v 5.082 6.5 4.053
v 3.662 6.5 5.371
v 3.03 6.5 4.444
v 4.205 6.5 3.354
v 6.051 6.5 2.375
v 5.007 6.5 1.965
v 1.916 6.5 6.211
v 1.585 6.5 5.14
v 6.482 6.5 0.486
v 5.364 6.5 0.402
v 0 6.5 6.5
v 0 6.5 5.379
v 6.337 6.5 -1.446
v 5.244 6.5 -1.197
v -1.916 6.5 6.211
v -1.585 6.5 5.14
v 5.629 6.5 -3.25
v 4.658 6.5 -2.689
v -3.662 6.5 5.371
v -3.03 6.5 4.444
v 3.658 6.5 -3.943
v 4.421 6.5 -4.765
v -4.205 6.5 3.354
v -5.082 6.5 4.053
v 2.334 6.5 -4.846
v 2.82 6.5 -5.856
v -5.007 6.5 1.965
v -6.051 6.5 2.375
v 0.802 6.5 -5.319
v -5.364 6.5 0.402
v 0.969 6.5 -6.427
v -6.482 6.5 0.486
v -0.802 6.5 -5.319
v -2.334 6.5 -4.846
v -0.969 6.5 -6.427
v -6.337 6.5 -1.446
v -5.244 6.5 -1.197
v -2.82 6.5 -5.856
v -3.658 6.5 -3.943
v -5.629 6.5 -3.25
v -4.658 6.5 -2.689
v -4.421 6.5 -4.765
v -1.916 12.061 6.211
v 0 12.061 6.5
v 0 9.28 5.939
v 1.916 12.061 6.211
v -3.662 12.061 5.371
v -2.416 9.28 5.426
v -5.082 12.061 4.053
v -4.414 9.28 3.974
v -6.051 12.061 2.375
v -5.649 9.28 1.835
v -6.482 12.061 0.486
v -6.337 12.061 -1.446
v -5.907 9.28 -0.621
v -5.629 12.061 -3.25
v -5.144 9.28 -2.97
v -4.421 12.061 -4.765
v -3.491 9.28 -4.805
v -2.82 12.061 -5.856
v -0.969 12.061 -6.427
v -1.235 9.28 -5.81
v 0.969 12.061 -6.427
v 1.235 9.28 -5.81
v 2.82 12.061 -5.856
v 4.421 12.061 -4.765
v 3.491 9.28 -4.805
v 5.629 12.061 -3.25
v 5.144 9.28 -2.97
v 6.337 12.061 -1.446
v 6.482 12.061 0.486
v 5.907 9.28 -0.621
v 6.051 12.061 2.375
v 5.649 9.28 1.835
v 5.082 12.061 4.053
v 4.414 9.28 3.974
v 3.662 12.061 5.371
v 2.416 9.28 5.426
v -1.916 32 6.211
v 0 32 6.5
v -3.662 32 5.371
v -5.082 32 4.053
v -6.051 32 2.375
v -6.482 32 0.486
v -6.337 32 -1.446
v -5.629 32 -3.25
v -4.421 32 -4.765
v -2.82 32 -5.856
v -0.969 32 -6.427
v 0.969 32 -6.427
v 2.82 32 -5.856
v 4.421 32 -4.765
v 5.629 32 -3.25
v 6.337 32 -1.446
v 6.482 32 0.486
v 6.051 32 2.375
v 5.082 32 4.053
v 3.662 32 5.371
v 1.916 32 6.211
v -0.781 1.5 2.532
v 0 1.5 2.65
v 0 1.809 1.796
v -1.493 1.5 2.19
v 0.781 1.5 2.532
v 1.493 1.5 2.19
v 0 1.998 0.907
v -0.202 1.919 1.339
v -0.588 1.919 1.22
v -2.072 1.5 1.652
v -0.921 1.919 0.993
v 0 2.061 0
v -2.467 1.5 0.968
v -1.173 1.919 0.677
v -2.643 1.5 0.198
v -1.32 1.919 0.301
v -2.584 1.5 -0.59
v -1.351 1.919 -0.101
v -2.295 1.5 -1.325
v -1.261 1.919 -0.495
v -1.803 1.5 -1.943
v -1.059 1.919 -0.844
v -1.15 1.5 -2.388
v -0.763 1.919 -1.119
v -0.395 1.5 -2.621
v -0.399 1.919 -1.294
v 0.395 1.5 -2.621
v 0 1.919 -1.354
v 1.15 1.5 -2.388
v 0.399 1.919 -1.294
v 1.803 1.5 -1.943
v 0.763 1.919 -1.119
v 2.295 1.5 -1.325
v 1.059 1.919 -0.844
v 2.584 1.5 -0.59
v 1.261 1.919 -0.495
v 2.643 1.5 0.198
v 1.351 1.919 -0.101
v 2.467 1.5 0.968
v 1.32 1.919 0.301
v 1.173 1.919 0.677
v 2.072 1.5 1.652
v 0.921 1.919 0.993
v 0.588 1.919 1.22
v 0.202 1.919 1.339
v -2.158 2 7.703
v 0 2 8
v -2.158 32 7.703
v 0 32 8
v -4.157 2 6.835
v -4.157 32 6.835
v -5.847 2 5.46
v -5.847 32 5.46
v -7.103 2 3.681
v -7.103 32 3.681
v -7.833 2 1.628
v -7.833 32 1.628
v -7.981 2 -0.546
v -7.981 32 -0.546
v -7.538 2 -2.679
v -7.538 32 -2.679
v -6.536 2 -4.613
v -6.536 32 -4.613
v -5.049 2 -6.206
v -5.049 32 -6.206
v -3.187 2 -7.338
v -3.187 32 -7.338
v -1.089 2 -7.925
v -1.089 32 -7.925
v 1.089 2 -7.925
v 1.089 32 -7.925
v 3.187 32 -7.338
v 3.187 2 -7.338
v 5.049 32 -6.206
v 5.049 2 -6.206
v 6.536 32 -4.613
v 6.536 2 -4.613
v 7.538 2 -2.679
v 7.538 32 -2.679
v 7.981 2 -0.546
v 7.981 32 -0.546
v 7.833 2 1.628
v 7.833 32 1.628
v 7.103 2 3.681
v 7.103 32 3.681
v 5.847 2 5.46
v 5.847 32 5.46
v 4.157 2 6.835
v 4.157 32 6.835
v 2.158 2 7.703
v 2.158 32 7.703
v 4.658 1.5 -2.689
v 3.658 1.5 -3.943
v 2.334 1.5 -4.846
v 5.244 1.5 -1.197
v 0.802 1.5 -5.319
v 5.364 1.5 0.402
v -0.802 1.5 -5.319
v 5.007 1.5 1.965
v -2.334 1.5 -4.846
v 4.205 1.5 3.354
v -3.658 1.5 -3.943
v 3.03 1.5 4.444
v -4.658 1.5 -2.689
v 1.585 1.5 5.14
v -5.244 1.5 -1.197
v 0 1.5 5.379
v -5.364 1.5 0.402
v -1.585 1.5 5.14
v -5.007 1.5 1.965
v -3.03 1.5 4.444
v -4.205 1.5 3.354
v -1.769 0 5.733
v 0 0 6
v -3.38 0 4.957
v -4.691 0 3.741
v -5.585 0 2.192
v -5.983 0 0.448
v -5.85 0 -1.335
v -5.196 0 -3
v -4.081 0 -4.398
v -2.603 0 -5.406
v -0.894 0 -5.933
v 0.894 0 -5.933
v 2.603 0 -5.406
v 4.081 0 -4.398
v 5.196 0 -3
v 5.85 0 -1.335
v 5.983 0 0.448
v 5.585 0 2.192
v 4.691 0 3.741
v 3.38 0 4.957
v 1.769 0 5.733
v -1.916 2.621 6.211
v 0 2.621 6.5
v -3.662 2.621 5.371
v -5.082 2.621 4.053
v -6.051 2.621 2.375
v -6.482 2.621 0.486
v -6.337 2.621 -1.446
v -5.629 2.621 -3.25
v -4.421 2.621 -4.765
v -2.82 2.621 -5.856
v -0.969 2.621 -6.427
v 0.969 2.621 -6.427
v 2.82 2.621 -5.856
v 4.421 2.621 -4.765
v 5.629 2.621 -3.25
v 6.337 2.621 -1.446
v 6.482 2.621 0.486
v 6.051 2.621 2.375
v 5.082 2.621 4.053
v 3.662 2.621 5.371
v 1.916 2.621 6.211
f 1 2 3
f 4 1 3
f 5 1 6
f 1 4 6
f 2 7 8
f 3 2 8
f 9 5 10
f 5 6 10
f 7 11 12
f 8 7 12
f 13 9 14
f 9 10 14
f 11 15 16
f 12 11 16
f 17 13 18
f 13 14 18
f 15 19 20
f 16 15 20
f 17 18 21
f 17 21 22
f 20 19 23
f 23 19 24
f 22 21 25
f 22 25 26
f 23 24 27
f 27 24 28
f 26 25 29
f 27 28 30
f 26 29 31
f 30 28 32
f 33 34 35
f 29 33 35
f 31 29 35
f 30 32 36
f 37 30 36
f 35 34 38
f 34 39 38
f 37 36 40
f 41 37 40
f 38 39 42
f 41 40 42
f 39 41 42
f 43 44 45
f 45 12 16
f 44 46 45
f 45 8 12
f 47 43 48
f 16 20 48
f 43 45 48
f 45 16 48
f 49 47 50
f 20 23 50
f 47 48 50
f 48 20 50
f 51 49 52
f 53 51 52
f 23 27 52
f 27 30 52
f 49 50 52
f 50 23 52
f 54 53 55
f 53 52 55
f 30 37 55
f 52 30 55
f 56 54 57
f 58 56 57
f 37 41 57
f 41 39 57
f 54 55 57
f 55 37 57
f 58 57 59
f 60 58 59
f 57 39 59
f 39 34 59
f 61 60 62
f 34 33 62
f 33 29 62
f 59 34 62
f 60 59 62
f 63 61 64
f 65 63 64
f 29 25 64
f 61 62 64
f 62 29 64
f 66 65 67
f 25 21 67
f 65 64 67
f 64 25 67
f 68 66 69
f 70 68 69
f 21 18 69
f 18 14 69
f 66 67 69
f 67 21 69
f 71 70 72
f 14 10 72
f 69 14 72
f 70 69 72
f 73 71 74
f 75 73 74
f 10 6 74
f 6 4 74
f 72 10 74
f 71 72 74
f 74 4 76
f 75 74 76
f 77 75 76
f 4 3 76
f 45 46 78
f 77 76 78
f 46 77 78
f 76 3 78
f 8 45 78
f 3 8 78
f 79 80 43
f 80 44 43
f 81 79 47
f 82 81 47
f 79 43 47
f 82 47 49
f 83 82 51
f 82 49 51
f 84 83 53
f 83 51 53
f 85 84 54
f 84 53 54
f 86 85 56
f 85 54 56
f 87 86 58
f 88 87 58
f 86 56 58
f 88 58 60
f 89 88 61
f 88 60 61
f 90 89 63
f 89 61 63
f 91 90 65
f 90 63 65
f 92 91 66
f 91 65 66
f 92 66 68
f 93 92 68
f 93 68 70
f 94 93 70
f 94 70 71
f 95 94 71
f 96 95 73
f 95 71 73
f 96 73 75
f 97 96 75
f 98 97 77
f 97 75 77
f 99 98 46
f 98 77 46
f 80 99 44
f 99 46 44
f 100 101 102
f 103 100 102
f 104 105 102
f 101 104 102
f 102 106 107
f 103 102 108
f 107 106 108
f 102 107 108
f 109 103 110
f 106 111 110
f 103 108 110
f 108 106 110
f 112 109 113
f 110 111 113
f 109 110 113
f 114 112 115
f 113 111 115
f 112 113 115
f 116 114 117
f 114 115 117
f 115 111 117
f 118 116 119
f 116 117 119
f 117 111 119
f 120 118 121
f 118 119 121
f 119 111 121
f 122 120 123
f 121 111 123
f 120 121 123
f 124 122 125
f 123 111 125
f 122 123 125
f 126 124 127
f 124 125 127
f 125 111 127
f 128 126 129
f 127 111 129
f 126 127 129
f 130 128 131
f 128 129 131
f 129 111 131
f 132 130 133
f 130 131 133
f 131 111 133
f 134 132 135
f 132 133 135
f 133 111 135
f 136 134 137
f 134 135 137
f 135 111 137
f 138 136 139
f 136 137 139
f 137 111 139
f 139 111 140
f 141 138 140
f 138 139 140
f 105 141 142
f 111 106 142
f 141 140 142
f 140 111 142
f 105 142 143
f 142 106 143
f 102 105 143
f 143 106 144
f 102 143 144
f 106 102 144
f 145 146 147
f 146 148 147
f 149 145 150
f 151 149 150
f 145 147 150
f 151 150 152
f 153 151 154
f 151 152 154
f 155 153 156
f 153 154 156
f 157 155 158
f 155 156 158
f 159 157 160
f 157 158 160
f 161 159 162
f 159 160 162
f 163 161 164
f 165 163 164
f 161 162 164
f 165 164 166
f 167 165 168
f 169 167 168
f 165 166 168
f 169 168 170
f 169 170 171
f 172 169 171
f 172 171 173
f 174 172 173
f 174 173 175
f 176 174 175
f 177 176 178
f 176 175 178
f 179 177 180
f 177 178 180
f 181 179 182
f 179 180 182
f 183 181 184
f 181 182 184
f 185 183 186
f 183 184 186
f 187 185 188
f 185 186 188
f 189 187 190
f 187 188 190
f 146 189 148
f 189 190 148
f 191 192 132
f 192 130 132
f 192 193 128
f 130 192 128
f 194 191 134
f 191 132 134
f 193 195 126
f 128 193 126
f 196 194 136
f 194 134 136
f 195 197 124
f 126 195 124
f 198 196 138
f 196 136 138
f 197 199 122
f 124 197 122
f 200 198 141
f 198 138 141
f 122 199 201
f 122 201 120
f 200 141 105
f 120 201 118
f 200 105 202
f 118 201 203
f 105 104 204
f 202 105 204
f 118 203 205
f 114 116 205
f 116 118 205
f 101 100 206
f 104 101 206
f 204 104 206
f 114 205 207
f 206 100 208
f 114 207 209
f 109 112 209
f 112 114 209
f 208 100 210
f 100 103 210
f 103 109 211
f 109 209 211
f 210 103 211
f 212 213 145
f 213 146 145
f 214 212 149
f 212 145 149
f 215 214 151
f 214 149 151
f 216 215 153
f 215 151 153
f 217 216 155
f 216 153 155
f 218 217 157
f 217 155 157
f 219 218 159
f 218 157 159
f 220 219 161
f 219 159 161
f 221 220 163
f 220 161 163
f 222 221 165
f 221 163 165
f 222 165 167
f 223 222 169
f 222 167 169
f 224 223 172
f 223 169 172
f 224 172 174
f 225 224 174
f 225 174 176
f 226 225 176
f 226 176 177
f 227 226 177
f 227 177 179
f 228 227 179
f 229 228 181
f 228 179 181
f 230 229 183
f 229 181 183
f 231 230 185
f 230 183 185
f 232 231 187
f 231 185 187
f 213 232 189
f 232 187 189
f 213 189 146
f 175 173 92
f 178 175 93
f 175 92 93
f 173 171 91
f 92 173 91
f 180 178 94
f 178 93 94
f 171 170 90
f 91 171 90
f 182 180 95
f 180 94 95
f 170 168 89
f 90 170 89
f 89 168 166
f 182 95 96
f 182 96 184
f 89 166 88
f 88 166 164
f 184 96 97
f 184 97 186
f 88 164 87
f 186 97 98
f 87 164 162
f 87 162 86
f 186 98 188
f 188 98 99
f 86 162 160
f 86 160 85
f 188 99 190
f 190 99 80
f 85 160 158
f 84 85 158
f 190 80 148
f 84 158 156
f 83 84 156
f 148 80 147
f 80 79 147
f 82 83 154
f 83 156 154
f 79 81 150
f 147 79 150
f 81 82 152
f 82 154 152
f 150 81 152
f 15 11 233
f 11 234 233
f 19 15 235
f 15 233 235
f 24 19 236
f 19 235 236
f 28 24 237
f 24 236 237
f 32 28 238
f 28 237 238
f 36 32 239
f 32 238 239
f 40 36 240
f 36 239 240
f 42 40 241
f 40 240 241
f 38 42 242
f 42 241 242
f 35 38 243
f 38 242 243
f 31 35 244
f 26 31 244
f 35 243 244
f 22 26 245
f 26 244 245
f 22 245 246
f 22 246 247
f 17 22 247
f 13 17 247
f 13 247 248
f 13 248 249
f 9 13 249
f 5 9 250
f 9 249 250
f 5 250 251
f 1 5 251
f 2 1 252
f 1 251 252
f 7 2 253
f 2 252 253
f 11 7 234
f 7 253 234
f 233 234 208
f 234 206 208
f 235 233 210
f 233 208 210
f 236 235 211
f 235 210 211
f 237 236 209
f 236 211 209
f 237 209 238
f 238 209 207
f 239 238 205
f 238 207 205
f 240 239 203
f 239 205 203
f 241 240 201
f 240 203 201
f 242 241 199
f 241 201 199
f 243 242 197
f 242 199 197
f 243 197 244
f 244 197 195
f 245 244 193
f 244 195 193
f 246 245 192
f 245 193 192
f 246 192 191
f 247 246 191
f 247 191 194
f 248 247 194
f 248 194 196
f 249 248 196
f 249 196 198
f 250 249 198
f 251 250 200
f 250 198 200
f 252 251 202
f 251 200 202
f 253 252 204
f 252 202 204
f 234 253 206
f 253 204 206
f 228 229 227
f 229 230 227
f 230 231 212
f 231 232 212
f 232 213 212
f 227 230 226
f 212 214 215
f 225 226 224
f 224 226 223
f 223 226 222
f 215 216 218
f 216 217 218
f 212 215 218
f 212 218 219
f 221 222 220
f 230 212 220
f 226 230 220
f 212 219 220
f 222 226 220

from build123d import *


with BuildPart() as part:
    # Sketch2 → Revolve1 (revolve)
    with BuildSketch(Plane(origin=(0, 0, 0), x_dir=(0, 0, -1), z_dir=(1, 0, 0)), mode=Mode.PRIVATE) as revolve1_sk:
        with BuildLine():
            Line((0, 0), (6, 0))
            Line((6, 0), (8, 2))
            Line((8, 2), (8, 32))
            Line((8, 32), (6.5, 32))
            Line((6.5, 32), (6.5, 12.060660172))
            Line((6.5, 12.060660172), (5.378679656, 6.5))
            Line((5.378679656, 6.5), (6.5, 6.5))
            Line((6.5, 6.5), (6.5, 2.621320344))
            Line((6.5, 2.621320344), (5.378679656, 1.5))
            Line((5.378679656, 1.5), (2.65014975, 1.5))
            ThreePointArc((2.65014975, 1.5), (1.35440333, 1.91896094), (0, 2.060660172))
            Line((0, 2.060660172), (0, 0))
        make_face()
    revolve(revolve1_sk.sketch.rotate(Axis((0, 2.060660172, 0), (0, -1, 0)), 180), axis=Axis((0, 2.060660172, 0), (0, -1, 0)))


solid = part.part
